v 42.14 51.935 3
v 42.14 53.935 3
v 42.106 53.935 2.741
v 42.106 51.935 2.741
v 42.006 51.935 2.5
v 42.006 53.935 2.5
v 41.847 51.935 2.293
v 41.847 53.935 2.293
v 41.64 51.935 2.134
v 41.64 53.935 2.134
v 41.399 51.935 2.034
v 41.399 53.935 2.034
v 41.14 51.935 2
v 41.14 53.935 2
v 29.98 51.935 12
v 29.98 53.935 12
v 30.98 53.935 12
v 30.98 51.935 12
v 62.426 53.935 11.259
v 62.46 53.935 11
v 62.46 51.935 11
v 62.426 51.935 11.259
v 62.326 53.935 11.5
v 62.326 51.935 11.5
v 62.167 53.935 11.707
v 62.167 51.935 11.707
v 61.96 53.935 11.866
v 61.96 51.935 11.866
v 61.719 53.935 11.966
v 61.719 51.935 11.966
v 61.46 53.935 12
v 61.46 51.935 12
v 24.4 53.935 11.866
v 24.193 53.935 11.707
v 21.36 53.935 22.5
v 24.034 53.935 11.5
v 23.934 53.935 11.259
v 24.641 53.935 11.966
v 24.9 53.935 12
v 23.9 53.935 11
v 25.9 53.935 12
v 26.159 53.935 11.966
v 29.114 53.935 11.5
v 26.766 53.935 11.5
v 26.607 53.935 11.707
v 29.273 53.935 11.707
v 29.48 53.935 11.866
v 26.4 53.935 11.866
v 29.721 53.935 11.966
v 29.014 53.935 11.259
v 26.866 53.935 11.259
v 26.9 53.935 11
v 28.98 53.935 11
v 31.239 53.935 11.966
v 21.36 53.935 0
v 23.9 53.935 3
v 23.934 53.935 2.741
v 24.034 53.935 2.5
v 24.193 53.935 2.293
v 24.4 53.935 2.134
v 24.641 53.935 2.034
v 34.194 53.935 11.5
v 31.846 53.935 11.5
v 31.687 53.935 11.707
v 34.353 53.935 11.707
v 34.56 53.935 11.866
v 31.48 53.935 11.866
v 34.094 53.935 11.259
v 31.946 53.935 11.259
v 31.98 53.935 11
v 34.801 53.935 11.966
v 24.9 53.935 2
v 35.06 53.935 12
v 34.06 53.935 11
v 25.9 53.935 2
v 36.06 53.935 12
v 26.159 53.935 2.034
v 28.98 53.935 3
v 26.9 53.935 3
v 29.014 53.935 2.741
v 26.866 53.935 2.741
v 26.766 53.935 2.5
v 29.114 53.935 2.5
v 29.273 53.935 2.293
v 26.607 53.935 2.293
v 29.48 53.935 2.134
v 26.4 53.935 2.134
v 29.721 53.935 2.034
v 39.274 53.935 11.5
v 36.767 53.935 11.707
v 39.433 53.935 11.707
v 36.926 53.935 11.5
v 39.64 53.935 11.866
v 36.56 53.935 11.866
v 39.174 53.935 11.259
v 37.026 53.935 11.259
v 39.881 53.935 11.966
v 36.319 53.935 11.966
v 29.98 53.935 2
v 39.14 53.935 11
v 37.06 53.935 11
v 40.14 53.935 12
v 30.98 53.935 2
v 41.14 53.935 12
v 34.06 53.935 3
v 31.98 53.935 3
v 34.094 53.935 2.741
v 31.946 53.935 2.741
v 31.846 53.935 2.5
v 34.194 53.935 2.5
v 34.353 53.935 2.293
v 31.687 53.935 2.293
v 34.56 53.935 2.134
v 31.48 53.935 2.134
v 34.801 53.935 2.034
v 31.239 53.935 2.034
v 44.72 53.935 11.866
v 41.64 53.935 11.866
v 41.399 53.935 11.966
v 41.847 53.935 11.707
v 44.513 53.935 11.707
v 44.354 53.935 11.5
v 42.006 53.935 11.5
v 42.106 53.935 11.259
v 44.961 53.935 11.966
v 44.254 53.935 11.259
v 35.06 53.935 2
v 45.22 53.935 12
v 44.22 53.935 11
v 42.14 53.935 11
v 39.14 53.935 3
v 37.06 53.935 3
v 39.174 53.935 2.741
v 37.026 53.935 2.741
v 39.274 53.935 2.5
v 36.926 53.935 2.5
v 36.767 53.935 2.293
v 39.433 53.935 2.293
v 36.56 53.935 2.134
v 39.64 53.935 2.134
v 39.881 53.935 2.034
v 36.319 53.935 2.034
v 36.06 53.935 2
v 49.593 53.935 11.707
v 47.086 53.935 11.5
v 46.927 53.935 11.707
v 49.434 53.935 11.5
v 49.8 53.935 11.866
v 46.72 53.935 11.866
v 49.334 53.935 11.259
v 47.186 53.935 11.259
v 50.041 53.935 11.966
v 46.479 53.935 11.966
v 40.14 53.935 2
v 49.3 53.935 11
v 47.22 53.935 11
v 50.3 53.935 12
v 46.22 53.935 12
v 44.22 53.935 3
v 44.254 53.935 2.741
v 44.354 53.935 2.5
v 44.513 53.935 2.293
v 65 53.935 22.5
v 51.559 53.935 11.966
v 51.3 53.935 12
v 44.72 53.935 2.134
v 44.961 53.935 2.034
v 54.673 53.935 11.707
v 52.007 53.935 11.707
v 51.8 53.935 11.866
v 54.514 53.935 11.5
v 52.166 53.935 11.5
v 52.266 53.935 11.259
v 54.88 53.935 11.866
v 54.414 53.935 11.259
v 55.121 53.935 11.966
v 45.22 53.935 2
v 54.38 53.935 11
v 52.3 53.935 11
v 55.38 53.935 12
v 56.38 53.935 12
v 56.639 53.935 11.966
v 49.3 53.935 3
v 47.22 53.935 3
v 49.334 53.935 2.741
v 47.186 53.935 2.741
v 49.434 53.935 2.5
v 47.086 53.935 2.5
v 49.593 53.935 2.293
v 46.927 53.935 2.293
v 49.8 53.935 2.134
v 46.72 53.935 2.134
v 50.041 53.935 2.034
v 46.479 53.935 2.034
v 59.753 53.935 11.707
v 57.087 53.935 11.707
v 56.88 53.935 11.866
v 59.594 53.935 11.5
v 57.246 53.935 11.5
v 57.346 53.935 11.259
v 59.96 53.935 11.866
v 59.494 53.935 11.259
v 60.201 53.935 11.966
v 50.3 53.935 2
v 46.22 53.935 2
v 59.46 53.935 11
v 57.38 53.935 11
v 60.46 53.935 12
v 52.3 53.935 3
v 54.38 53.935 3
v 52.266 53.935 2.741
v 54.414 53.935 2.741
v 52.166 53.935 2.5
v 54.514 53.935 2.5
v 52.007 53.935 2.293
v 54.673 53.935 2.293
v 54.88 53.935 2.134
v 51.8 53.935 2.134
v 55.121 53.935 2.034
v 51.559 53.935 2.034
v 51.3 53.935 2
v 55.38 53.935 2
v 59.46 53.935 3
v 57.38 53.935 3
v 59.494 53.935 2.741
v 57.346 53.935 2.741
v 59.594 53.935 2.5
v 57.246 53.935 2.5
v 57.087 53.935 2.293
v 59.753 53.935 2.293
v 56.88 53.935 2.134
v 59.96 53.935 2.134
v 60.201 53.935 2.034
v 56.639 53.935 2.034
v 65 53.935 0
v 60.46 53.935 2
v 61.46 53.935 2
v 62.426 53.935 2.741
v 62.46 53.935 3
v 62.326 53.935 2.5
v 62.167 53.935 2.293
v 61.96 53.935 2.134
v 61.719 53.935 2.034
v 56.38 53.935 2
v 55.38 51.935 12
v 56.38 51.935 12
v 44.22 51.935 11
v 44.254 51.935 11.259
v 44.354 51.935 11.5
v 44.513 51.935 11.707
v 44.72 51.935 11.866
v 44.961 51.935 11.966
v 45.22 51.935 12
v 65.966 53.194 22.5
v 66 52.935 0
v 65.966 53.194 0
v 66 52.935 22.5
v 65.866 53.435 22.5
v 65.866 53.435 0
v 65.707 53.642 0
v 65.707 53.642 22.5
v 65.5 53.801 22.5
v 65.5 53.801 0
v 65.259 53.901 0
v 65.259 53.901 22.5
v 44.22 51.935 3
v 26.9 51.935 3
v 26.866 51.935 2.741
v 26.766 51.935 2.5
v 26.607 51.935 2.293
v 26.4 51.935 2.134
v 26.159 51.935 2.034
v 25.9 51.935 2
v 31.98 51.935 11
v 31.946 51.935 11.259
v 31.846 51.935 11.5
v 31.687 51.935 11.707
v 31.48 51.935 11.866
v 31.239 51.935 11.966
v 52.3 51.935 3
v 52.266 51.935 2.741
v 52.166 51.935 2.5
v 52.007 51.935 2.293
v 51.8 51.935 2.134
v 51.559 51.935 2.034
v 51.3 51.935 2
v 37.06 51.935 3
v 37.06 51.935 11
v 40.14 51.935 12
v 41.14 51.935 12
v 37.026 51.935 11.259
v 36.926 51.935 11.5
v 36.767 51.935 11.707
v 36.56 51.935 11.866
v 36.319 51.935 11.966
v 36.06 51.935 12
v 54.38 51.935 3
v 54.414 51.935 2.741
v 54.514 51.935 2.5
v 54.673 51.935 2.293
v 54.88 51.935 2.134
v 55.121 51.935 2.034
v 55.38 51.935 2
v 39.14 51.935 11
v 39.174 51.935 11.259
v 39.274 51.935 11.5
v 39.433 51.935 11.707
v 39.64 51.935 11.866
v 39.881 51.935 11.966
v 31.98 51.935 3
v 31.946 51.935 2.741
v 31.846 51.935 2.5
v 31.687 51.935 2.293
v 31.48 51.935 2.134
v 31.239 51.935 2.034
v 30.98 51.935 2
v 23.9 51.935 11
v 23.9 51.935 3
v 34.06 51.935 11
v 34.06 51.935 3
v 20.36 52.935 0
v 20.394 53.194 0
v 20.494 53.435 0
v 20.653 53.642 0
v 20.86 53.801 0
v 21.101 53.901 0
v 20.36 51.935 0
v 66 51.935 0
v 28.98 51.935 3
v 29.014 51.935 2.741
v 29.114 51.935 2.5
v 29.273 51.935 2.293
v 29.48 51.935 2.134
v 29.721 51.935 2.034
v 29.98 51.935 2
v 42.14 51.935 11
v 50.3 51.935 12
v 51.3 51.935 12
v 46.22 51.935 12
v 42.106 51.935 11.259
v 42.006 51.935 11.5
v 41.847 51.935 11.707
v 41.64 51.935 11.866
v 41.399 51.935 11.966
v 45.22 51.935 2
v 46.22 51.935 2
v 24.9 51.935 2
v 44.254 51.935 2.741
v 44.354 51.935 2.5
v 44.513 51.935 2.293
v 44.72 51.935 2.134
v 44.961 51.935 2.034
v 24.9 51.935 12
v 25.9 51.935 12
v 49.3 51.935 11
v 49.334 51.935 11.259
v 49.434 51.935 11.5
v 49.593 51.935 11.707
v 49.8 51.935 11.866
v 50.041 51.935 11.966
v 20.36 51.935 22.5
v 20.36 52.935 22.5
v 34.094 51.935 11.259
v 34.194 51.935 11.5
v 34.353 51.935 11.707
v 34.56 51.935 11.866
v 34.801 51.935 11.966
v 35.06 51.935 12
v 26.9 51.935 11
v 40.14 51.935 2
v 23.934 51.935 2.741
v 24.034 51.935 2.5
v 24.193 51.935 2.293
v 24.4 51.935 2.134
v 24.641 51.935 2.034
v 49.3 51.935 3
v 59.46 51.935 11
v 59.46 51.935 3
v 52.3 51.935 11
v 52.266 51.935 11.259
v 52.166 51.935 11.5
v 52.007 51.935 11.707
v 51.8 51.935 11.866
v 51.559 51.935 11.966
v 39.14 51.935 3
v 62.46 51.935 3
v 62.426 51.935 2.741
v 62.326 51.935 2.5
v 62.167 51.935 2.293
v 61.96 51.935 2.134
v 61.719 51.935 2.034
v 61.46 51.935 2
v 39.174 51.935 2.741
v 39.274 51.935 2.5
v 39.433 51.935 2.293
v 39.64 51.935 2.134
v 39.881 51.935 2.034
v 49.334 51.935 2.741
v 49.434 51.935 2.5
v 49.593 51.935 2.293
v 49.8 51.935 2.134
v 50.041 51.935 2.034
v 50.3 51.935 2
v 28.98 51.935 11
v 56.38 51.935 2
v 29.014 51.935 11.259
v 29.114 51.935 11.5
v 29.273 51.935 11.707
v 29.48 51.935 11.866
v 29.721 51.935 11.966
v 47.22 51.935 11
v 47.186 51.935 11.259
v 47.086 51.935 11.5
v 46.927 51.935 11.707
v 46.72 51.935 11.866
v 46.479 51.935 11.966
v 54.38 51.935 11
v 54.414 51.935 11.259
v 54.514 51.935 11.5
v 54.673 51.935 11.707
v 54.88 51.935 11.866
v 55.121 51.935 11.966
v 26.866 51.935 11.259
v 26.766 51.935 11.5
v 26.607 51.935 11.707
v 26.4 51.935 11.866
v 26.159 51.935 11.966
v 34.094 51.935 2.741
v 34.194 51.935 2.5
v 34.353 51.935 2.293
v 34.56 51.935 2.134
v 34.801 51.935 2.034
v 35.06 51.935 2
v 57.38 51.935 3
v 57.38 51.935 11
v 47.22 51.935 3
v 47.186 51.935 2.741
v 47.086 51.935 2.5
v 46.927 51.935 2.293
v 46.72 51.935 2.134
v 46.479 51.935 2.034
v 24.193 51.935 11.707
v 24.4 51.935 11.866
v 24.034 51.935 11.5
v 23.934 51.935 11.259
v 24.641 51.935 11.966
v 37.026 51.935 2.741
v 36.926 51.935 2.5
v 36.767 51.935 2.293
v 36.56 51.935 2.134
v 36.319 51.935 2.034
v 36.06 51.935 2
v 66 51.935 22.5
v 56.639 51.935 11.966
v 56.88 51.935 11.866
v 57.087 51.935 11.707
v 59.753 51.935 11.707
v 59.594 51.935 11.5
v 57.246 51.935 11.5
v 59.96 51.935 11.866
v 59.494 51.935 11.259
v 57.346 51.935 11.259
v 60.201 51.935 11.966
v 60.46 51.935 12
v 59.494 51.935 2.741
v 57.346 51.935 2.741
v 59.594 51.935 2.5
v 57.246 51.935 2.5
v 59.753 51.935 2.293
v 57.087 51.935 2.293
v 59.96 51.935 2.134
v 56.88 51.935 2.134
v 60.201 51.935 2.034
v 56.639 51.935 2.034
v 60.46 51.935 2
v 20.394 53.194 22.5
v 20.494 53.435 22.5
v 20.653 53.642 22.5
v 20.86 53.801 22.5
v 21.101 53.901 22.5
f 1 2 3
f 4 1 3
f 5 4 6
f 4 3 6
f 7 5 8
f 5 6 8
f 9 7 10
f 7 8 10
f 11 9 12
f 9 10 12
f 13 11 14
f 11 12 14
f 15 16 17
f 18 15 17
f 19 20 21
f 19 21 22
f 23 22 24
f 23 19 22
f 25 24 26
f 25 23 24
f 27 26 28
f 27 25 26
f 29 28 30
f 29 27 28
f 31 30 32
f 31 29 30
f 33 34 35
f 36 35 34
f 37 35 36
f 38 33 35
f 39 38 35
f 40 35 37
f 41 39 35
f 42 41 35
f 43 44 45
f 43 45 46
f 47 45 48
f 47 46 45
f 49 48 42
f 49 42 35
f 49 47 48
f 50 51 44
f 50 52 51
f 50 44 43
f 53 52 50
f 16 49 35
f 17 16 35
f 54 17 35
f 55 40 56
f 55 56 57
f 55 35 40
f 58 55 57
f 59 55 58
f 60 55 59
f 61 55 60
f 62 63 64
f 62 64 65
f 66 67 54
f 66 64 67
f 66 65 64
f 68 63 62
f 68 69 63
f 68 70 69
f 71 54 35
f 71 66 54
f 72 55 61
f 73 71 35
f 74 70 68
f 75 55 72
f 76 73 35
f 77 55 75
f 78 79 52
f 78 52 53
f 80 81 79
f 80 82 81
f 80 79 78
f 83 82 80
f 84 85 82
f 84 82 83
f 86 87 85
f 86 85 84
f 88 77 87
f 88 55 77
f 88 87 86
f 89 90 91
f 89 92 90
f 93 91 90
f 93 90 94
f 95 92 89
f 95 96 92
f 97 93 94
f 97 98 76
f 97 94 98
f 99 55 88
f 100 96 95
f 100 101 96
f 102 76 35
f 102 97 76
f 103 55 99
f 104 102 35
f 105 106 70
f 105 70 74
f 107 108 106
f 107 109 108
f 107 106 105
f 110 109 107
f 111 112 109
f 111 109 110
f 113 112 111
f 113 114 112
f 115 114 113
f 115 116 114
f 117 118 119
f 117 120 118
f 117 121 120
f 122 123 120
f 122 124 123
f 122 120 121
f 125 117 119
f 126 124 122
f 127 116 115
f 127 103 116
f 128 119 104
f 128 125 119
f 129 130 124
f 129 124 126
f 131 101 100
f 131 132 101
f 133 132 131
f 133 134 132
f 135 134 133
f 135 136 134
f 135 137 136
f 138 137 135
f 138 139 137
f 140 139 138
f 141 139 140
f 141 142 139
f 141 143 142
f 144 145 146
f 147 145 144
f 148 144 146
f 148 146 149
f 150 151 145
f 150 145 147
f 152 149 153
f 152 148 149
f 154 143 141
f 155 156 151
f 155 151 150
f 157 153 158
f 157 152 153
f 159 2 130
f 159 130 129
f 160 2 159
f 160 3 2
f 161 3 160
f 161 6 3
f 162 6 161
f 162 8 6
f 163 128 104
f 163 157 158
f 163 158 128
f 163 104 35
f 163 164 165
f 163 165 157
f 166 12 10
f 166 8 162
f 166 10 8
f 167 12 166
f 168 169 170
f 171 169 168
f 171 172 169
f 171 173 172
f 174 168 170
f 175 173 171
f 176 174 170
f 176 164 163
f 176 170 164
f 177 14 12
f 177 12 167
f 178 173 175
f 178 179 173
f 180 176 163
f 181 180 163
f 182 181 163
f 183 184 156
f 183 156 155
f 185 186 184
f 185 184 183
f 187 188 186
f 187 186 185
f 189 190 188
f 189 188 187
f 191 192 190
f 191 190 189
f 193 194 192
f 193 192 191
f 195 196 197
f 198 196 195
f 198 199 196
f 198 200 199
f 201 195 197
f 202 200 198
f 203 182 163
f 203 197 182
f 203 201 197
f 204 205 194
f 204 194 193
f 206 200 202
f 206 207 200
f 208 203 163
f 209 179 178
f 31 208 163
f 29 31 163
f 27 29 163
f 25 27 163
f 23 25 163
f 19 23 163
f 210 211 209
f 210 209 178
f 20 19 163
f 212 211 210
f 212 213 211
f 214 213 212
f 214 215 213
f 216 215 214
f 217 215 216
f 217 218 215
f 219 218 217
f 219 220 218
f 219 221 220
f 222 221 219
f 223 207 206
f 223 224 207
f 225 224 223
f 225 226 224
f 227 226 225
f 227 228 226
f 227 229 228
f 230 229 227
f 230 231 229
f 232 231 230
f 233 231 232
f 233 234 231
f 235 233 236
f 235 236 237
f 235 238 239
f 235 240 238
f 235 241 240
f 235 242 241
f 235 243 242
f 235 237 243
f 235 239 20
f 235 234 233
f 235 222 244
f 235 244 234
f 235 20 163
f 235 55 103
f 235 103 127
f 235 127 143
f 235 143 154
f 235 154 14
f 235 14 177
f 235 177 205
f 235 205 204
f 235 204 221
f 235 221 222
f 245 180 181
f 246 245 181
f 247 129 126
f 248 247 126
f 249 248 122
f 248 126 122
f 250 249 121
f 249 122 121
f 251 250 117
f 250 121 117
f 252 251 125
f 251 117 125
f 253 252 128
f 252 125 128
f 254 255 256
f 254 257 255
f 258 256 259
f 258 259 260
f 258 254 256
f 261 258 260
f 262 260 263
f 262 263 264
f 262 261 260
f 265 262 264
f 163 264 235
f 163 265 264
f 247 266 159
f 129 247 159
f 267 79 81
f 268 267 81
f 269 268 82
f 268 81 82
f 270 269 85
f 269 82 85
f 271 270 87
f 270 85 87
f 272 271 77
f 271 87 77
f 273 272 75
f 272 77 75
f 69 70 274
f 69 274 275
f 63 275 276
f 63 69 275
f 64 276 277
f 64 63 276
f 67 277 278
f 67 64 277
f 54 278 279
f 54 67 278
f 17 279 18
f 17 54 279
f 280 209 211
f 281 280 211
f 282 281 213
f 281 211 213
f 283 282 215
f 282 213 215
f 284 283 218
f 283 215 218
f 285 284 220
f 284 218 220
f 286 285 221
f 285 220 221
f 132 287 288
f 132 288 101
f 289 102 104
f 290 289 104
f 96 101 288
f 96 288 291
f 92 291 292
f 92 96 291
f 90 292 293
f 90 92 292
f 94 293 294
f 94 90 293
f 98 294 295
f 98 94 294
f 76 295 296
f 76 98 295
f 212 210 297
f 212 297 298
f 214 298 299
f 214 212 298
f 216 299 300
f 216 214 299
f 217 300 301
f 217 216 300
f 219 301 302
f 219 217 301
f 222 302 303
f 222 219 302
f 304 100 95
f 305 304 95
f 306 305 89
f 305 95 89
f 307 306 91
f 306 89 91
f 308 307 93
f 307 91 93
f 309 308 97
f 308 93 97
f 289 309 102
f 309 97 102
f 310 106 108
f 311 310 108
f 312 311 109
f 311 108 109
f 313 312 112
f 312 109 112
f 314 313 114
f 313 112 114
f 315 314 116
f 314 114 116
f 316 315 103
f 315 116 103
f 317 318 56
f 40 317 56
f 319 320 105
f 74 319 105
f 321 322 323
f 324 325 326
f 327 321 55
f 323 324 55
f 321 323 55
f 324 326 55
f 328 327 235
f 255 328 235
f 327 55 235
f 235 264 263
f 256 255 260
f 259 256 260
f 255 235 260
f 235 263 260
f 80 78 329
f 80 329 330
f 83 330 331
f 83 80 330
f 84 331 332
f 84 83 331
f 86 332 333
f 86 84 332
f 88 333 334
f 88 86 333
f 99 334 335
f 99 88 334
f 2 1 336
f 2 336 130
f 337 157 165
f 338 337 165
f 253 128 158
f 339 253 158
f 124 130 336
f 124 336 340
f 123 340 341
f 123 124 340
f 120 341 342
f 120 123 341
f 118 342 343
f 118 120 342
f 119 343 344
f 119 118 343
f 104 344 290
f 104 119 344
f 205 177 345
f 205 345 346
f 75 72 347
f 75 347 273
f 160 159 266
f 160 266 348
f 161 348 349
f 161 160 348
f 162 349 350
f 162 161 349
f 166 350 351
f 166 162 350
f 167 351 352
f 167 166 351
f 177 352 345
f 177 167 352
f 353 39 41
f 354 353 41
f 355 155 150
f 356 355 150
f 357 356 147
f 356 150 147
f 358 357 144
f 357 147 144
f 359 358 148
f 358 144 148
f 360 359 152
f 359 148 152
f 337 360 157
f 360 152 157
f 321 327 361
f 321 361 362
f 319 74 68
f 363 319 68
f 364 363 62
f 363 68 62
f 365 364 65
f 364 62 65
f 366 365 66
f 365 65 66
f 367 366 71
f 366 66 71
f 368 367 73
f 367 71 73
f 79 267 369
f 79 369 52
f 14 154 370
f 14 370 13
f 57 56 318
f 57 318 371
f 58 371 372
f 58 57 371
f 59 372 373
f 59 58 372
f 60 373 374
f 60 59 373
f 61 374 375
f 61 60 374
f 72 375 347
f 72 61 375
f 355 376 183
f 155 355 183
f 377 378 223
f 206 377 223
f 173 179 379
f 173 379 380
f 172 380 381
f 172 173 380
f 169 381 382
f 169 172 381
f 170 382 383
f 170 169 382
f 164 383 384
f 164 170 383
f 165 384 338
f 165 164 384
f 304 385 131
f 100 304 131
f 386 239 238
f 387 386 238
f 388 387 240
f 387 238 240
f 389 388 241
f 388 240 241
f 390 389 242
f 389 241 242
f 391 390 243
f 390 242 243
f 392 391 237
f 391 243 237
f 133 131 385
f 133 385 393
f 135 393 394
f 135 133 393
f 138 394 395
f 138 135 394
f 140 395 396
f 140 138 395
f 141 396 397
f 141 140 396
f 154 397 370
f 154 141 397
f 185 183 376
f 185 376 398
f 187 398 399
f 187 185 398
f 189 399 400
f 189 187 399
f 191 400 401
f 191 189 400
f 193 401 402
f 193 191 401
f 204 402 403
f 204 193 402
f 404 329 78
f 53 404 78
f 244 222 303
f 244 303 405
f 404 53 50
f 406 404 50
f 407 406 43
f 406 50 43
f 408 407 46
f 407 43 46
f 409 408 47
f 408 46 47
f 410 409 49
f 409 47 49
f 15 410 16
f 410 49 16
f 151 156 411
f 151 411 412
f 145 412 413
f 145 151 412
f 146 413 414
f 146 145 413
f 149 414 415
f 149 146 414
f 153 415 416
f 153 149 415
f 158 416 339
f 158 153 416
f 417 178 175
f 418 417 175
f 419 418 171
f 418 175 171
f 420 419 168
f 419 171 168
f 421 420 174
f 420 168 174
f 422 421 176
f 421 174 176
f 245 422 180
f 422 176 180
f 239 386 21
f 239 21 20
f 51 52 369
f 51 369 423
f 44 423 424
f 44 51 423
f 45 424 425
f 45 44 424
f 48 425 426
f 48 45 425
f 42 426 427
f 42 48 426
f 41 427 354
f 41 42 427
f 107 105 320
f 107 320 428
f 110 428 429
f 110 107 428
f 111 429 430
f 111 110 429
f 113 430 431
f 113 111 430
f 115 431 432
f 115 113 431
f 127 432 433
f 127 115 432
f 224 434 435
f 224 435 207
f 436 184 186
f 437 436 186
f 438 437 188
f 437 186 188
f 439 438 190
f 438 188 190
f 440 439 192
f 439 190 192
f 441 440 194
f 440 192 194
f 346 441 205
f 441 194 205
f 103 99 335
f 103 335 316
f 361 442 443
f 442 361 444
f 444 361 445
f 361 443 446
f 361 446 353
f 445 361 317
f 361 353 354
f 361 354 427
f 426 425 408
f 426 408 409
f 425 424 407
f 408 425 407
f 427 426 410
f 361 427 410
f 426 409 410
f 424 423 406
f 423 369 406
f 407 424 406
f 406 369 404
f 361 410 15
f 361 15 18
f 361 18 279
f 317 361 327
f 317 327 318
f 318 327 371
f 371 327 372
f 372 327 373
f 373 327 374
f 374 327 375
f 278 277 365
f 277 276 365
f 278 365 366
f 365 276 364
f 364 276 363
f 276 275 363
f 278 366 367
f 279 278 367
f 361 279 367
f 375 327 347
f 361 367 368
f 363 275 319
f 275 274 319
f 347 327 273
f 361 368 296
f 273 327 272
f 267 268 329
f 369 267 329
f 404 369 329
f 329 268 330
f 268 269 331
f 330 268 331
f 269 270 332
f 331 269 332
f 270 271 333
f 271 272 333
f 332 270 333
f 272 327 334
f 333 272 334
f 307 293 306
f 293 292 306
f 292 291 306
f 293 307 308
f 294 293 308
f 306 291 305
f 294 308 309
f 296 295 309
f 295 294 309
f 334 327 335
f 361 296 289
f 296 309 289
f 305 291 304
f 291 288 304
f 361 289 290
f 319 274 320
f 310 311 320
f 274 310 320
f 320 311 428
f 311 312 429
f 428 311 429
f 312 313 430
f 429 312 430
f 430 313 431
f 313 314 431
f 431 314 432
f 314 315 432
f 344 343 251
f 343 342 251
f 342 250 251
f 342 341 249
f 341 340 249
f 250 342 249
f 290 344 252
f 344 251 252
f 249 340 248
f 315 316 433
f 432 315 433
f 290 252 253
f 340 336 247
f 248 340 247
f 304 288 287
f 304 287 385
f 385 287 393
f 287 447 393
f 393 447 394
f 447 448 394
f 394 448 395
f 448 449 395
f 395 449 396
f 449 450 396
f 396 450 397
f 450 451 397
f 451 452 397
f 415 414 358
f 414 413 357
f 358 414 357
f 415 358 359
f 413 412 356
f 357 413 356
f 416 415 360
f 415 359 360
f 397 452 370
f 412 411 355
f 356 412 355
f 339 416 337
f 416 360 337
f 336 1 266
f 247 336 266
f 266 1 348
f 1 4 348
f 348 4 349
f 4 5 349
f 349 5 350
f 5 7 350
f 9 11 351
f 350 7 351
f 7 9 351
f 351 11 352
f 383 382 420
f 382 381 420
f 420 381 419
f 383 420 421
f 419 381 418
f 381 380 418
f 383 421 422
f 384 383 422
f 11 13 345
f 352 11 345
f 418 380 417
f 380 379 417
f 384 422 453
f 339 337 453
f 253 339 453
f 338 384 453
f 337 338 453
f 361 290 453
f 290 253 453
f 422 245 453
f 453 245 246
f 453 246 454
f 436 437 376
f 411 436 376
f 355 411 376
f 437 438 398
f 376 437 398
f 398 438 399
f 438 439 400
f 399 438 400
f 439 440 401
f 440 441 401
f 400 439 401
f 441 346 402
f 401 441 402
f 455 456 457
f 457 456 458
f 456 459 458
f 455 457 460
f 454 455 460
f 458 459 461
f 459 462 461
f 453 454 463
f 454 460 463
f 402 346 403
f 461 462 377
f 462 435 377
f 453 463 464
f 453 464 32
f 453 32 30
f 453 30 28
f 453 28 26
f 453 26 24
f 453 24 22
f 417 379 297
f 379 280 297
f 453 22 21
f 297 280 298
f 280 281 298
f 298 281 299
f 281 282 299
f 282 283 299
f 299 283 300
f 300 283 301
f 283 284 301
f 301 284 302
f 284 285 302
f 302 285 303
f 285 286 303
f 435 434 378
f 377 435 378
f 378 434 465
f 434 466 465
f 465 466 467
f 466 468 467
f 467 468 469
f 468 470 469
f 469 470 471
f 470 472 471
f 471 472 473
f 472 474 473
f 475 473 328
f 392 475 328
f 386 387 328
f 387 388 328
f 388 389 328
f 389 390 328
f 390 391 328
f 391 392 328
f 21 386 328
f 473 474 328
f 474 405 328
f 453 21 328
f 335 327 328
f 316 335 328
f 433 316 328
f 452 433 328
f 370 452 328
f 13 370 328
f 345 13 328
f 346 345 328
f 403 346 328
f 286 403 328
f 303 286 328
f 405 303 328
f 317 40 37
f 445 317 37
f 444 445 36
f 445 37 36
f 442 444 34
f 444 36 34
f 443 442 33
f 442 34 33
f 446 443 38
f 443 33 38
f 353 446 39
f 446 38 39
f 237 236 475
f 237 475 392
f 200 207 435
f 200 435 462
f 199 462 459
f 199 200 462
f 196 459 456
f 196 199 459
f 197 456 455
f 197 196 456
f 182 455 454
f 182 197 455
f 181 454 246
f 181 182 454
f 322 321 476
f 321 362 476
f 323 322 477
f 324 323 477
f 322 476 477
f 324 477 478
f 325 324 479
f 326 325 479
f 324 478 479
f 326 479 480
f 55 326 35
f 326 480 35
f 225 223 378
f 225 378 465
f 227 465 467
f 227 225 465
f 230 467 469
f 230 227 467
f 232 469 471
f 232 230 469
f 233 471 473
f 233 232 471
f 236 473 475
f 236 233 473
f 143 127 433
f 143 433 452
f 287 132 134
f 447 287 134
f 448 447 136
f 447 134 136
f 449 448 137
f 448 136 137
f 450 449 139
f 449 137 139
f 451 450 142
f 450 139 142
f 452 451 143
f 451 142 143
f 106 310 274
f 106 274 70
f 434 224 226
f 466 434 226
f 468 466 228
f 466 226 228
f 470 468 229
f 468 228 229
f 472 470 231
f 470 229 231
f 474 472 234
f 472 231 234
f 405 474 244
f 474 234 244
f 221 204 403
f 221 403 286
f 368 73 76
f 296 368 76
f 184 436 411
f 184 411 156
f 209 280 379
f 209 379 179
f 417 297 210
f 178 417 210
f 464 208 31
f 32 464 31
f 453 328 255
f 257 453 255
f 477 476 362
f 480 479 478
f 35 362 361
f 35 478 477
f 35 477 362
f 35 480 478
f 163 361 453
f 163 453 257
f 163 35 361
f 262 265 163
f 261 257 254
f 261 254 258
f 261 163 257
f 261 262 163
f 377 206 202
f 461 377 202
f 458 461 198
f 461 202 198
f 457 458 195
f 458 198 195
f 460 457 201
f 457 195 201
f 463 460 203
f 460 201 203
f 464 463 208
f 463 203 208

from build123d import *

# Parameters (mm, degrees)
BOX036_W     = 3
BOX036_H     = 10.16
BOX036_DEPTH = 10
FILLET002_R  = 1
BOX035_W     = 3
BOX035_H     = 10.16
BOX035_DEPTH = 10
FILLET001_R  = 1
BOX037_W     = 3
BOX037_H     = 10.16
BOX037_DEPTH = 10
FILLET003_R  = 1
BOX038_W     = 3
BOX038_H     = 10.16
BOX038_DEPTH = 10
FILLET004_R  = 1
BOX039_W     = 3
BOX039_H     = 10.16
BOX039_DEPTH = 10
FILLET005_R  = 1
BOX040_W     = 3
BOX040_H     = 10.16
BOX040_DEPTH = 10
FILLET006_R  = 1
BOX041_W     = 3
BOX041_H     = 10.16
BOX041_DEPTH = 10
FILLET007_R  = 1
BOX032_W     = 3
BOX032_H     = 10.16
BOX032_DEPTH = 10
FILLET_R     = 1
BOX021_W     = 45.64
BOX021_H     = 2
BOX021_DEPTH = 22.5
FILLET008_R  = 1


with BuildPart() as fillet002:
    # Box036 → Box036 (new body)
    with BuildSketch(Plane(origin=(49.3, 45.775, 2), x_dir=(1, 0, 0), z_dir=(0, 0, 1))):
        with Locations((1.5, 5.08)):
            Rectangle(BOX036_W, BOX036_H)
    extrude(amount=BOX036_DEPTH)

    # Fillet002
    fillet002_edges = [fillet002.edges().sort_by_distance(p)[0] for p in [
        (49.3, 50.855, 12),
        (49.3, 50.855, 2),
        (52.3, 50.855, 12),
        (52.3, 50.855, 2),
    ]]
    fillet(fillet002_edges, radius=FILLET002_R)


with BuildPart() as fillet001:
    # Box035 → Box035 (new body)
    with BuildSketch(Plane(origin=(54.38, 45.775, 2), x_dir=(1, 0, 0), z_dir=(0, 0, 1))):
        with Locations((1.5, 5.08)):
            Rectangle(BOX035_W, BOX035_H)
    extrude(amount=BOX035_DEPTH)

    # Fillet001
    fillet001_edges = [fillet001.edges().sort_by_distance(p)[0] for p in [
        (54.38, 50.855, 12),
        (54.38, 50.855, 2),
        (57.38, 50.855, 12),
        (57.38, 50.855, 2),
    ]]
    fillet(fillet001_edges, radius=FILLET001_R)


with BuildPart() as fillet003:
    # Box037 → Box037 (new body)
    with BuildSketch(Plane(origin=(44.22, 45.775, 2), x_dir=(1, 0, 0), z_dir=(0, 0, 1))):
        with Locations((1.5, 5.08)):
            Rectangle(BOX037_W, BOX037_H)
    extrude(amount=BOX037_DEPTH)

    # Fillet003
    fillet003_edges = [fillet003.edges().sort_by_distance(p)[0] for p in [
        (44.22, 50.855, 12),
        (44.22, 50.855, 2),
        (47.22, 50.855, 12),
        (47.22, 50.855, 2),
    ]]
    fillet(fillet003_edges, radius=FILLET003_R)


with BuildPart() as fillet004:
    # Box038 → Box038 (new body)
    with BuildSketch(Plane(origin=(39.14, 45.775, 2), x_dir=(1, 0, 0), z_dir=(0, 0, 1))):
        with Locations((1.5, 5.08)):
            Rectangle(BOX038_W, BOX038_H)
    extrude(amount=BOX038_DEPTH)

    # Fillet004
    fillet004_edges = [fillet004.edges().sort_by_distance(p)[0] for p in [
        (39.14, 50.855, 12),
        (39.14, 50.855, 2),
        (42.14, 50.855, 12),
        (42.14, 50.855, 2),
    ]]
    fillet(fillet004_edges, radius=FILLET004_R)


with BuildPart() as fillet005:
    # Box039 → Box039 (new body)
    with BuildSketch(Plane(origin=(34.06, 45.775, 2), x_dir=(1, 0, 0), z_dir=(0, 0, 1))):
        with Locations((1.5, 5.08)):
            Rectangle(BOX039_W, BOX039_H)
    extrude(amount=BOX039_DEPTH)

    # Fillet005
    fillet005_edges = [fillet005.edges().sort_by_distance(p)[0] for p in [
        (34.06, 50.855, 12),
        (34.06, 50.855, 2),
        (37.06, 50.855, 12),
        (37.06, 50.855, 2),
    ]]
    fillet(fillet005_edges, radius=FILLET005_R)


with BuildPart() as fillet006:
    # Box040 → Box040 (new body)
    with BuildSketch(Plane(origin=(28.98, 45.775, 2), x_dir=(1, 0, 0), z_dir=(0, 0, 1))):
        with Locations((1.5, 5.08)):
            Rectangle(BOX040_W, BOX040_H)
    extrude(amount=BOX040_DEPTH)

    # Fillet006
    fillet006_edges = [fillet006.edges().sort_by_distance(p)[0] for p in [
        (28.98, 50.855, 12),
        (28.98, 50.855, 2),
        (31.98, 50.855, 12),
        (31.98, 50.855, 2),
    ]]
    fillet(fillet006_edges, radius=FILLET006_R)


with BuildPart() as fillet007:
    # Box041 → Box041 (new body)
    with BuildSketch(Plane(origin=(23.9, 45.775, 2), x_dir=(1, 0, 0), z_dir=(0, 0, 1))):
        with Locations((1.5, 5.08)):
            Rectangle(BOX041_W, BOX041_H)
    extrude(amount=BOX041_DEPTH)

    # Fillet007
    fillet007_edges = [fillet007.edges().sort_by_distance(p)[0] for p in [
        (23.9, 50.855, 12),
        (23.9, 50.855, 2),
        (26.9, 50.855, 12),
        (26.9, 50.855, 2),
    ]]
    fillet(fillet007_edges, radius=FILLET007_R)


with BuildPart() as fusion:
    # Box032 → Box032 (new body)
    with BuildSketch(Plane(origin=(59.46, 45.775, 2), x_dir=(1, 0, 0), z_dir=(0, 0, 1))):
        with Locations((1.5, 5.08)):
            Rectangle(BOX032_W, BOX032_H)
    extrude(amount=BOX032_DEPTH)

    # Fillet
    fillet_edges = [fusion.edges().sort_by_distance(p)[0] for p in [
        (59.46, 50.855, 12),
        (59.46, 50.855, 2),
        (62.46, 50.855, 12),
        (62.46, 50.855, 2),
    ]]
    fillet(fillet_edges, radius=FILLET_R)

    # Fusion: union Fillet002, Fillet001, Fillet003, Fillet004, Fillet005, Fillet006, Fillet007
    add(fillet002.part)
    add(fillet001.part)
    add(fillet003.part)
    add(fillet004.part)
    add(fillet005.part)
    add(fillet006.part)
    add(fillet007.part)


with BuildPart() as cut:
    # Box021 → Box021 (new body)
    with BuildSketch(Plane(origin=(20.36, 51.935, 0), x_dir=(1, 0, 0), z_dir=(0, 0, 1))):
        with Locations((22.82, 1)):
            Rectangle(BOX021_W, BOX021_H)
    extrude(amount=BOX021_DEPTH)

    # Fillet008
    fillet008_edges = [cut.edges().sort_by_distance(p)[0] for p in [
        (20.36, 53.935, 11.25),
        (66, 53.935, 11.25),
    ]]
    fillet(fillet008_edges, radius=FILLET008_R)

    # Cut: cut Fusion
    add(fusion.part, mode=Mode.SUBTRACT)


solid = cut.part
